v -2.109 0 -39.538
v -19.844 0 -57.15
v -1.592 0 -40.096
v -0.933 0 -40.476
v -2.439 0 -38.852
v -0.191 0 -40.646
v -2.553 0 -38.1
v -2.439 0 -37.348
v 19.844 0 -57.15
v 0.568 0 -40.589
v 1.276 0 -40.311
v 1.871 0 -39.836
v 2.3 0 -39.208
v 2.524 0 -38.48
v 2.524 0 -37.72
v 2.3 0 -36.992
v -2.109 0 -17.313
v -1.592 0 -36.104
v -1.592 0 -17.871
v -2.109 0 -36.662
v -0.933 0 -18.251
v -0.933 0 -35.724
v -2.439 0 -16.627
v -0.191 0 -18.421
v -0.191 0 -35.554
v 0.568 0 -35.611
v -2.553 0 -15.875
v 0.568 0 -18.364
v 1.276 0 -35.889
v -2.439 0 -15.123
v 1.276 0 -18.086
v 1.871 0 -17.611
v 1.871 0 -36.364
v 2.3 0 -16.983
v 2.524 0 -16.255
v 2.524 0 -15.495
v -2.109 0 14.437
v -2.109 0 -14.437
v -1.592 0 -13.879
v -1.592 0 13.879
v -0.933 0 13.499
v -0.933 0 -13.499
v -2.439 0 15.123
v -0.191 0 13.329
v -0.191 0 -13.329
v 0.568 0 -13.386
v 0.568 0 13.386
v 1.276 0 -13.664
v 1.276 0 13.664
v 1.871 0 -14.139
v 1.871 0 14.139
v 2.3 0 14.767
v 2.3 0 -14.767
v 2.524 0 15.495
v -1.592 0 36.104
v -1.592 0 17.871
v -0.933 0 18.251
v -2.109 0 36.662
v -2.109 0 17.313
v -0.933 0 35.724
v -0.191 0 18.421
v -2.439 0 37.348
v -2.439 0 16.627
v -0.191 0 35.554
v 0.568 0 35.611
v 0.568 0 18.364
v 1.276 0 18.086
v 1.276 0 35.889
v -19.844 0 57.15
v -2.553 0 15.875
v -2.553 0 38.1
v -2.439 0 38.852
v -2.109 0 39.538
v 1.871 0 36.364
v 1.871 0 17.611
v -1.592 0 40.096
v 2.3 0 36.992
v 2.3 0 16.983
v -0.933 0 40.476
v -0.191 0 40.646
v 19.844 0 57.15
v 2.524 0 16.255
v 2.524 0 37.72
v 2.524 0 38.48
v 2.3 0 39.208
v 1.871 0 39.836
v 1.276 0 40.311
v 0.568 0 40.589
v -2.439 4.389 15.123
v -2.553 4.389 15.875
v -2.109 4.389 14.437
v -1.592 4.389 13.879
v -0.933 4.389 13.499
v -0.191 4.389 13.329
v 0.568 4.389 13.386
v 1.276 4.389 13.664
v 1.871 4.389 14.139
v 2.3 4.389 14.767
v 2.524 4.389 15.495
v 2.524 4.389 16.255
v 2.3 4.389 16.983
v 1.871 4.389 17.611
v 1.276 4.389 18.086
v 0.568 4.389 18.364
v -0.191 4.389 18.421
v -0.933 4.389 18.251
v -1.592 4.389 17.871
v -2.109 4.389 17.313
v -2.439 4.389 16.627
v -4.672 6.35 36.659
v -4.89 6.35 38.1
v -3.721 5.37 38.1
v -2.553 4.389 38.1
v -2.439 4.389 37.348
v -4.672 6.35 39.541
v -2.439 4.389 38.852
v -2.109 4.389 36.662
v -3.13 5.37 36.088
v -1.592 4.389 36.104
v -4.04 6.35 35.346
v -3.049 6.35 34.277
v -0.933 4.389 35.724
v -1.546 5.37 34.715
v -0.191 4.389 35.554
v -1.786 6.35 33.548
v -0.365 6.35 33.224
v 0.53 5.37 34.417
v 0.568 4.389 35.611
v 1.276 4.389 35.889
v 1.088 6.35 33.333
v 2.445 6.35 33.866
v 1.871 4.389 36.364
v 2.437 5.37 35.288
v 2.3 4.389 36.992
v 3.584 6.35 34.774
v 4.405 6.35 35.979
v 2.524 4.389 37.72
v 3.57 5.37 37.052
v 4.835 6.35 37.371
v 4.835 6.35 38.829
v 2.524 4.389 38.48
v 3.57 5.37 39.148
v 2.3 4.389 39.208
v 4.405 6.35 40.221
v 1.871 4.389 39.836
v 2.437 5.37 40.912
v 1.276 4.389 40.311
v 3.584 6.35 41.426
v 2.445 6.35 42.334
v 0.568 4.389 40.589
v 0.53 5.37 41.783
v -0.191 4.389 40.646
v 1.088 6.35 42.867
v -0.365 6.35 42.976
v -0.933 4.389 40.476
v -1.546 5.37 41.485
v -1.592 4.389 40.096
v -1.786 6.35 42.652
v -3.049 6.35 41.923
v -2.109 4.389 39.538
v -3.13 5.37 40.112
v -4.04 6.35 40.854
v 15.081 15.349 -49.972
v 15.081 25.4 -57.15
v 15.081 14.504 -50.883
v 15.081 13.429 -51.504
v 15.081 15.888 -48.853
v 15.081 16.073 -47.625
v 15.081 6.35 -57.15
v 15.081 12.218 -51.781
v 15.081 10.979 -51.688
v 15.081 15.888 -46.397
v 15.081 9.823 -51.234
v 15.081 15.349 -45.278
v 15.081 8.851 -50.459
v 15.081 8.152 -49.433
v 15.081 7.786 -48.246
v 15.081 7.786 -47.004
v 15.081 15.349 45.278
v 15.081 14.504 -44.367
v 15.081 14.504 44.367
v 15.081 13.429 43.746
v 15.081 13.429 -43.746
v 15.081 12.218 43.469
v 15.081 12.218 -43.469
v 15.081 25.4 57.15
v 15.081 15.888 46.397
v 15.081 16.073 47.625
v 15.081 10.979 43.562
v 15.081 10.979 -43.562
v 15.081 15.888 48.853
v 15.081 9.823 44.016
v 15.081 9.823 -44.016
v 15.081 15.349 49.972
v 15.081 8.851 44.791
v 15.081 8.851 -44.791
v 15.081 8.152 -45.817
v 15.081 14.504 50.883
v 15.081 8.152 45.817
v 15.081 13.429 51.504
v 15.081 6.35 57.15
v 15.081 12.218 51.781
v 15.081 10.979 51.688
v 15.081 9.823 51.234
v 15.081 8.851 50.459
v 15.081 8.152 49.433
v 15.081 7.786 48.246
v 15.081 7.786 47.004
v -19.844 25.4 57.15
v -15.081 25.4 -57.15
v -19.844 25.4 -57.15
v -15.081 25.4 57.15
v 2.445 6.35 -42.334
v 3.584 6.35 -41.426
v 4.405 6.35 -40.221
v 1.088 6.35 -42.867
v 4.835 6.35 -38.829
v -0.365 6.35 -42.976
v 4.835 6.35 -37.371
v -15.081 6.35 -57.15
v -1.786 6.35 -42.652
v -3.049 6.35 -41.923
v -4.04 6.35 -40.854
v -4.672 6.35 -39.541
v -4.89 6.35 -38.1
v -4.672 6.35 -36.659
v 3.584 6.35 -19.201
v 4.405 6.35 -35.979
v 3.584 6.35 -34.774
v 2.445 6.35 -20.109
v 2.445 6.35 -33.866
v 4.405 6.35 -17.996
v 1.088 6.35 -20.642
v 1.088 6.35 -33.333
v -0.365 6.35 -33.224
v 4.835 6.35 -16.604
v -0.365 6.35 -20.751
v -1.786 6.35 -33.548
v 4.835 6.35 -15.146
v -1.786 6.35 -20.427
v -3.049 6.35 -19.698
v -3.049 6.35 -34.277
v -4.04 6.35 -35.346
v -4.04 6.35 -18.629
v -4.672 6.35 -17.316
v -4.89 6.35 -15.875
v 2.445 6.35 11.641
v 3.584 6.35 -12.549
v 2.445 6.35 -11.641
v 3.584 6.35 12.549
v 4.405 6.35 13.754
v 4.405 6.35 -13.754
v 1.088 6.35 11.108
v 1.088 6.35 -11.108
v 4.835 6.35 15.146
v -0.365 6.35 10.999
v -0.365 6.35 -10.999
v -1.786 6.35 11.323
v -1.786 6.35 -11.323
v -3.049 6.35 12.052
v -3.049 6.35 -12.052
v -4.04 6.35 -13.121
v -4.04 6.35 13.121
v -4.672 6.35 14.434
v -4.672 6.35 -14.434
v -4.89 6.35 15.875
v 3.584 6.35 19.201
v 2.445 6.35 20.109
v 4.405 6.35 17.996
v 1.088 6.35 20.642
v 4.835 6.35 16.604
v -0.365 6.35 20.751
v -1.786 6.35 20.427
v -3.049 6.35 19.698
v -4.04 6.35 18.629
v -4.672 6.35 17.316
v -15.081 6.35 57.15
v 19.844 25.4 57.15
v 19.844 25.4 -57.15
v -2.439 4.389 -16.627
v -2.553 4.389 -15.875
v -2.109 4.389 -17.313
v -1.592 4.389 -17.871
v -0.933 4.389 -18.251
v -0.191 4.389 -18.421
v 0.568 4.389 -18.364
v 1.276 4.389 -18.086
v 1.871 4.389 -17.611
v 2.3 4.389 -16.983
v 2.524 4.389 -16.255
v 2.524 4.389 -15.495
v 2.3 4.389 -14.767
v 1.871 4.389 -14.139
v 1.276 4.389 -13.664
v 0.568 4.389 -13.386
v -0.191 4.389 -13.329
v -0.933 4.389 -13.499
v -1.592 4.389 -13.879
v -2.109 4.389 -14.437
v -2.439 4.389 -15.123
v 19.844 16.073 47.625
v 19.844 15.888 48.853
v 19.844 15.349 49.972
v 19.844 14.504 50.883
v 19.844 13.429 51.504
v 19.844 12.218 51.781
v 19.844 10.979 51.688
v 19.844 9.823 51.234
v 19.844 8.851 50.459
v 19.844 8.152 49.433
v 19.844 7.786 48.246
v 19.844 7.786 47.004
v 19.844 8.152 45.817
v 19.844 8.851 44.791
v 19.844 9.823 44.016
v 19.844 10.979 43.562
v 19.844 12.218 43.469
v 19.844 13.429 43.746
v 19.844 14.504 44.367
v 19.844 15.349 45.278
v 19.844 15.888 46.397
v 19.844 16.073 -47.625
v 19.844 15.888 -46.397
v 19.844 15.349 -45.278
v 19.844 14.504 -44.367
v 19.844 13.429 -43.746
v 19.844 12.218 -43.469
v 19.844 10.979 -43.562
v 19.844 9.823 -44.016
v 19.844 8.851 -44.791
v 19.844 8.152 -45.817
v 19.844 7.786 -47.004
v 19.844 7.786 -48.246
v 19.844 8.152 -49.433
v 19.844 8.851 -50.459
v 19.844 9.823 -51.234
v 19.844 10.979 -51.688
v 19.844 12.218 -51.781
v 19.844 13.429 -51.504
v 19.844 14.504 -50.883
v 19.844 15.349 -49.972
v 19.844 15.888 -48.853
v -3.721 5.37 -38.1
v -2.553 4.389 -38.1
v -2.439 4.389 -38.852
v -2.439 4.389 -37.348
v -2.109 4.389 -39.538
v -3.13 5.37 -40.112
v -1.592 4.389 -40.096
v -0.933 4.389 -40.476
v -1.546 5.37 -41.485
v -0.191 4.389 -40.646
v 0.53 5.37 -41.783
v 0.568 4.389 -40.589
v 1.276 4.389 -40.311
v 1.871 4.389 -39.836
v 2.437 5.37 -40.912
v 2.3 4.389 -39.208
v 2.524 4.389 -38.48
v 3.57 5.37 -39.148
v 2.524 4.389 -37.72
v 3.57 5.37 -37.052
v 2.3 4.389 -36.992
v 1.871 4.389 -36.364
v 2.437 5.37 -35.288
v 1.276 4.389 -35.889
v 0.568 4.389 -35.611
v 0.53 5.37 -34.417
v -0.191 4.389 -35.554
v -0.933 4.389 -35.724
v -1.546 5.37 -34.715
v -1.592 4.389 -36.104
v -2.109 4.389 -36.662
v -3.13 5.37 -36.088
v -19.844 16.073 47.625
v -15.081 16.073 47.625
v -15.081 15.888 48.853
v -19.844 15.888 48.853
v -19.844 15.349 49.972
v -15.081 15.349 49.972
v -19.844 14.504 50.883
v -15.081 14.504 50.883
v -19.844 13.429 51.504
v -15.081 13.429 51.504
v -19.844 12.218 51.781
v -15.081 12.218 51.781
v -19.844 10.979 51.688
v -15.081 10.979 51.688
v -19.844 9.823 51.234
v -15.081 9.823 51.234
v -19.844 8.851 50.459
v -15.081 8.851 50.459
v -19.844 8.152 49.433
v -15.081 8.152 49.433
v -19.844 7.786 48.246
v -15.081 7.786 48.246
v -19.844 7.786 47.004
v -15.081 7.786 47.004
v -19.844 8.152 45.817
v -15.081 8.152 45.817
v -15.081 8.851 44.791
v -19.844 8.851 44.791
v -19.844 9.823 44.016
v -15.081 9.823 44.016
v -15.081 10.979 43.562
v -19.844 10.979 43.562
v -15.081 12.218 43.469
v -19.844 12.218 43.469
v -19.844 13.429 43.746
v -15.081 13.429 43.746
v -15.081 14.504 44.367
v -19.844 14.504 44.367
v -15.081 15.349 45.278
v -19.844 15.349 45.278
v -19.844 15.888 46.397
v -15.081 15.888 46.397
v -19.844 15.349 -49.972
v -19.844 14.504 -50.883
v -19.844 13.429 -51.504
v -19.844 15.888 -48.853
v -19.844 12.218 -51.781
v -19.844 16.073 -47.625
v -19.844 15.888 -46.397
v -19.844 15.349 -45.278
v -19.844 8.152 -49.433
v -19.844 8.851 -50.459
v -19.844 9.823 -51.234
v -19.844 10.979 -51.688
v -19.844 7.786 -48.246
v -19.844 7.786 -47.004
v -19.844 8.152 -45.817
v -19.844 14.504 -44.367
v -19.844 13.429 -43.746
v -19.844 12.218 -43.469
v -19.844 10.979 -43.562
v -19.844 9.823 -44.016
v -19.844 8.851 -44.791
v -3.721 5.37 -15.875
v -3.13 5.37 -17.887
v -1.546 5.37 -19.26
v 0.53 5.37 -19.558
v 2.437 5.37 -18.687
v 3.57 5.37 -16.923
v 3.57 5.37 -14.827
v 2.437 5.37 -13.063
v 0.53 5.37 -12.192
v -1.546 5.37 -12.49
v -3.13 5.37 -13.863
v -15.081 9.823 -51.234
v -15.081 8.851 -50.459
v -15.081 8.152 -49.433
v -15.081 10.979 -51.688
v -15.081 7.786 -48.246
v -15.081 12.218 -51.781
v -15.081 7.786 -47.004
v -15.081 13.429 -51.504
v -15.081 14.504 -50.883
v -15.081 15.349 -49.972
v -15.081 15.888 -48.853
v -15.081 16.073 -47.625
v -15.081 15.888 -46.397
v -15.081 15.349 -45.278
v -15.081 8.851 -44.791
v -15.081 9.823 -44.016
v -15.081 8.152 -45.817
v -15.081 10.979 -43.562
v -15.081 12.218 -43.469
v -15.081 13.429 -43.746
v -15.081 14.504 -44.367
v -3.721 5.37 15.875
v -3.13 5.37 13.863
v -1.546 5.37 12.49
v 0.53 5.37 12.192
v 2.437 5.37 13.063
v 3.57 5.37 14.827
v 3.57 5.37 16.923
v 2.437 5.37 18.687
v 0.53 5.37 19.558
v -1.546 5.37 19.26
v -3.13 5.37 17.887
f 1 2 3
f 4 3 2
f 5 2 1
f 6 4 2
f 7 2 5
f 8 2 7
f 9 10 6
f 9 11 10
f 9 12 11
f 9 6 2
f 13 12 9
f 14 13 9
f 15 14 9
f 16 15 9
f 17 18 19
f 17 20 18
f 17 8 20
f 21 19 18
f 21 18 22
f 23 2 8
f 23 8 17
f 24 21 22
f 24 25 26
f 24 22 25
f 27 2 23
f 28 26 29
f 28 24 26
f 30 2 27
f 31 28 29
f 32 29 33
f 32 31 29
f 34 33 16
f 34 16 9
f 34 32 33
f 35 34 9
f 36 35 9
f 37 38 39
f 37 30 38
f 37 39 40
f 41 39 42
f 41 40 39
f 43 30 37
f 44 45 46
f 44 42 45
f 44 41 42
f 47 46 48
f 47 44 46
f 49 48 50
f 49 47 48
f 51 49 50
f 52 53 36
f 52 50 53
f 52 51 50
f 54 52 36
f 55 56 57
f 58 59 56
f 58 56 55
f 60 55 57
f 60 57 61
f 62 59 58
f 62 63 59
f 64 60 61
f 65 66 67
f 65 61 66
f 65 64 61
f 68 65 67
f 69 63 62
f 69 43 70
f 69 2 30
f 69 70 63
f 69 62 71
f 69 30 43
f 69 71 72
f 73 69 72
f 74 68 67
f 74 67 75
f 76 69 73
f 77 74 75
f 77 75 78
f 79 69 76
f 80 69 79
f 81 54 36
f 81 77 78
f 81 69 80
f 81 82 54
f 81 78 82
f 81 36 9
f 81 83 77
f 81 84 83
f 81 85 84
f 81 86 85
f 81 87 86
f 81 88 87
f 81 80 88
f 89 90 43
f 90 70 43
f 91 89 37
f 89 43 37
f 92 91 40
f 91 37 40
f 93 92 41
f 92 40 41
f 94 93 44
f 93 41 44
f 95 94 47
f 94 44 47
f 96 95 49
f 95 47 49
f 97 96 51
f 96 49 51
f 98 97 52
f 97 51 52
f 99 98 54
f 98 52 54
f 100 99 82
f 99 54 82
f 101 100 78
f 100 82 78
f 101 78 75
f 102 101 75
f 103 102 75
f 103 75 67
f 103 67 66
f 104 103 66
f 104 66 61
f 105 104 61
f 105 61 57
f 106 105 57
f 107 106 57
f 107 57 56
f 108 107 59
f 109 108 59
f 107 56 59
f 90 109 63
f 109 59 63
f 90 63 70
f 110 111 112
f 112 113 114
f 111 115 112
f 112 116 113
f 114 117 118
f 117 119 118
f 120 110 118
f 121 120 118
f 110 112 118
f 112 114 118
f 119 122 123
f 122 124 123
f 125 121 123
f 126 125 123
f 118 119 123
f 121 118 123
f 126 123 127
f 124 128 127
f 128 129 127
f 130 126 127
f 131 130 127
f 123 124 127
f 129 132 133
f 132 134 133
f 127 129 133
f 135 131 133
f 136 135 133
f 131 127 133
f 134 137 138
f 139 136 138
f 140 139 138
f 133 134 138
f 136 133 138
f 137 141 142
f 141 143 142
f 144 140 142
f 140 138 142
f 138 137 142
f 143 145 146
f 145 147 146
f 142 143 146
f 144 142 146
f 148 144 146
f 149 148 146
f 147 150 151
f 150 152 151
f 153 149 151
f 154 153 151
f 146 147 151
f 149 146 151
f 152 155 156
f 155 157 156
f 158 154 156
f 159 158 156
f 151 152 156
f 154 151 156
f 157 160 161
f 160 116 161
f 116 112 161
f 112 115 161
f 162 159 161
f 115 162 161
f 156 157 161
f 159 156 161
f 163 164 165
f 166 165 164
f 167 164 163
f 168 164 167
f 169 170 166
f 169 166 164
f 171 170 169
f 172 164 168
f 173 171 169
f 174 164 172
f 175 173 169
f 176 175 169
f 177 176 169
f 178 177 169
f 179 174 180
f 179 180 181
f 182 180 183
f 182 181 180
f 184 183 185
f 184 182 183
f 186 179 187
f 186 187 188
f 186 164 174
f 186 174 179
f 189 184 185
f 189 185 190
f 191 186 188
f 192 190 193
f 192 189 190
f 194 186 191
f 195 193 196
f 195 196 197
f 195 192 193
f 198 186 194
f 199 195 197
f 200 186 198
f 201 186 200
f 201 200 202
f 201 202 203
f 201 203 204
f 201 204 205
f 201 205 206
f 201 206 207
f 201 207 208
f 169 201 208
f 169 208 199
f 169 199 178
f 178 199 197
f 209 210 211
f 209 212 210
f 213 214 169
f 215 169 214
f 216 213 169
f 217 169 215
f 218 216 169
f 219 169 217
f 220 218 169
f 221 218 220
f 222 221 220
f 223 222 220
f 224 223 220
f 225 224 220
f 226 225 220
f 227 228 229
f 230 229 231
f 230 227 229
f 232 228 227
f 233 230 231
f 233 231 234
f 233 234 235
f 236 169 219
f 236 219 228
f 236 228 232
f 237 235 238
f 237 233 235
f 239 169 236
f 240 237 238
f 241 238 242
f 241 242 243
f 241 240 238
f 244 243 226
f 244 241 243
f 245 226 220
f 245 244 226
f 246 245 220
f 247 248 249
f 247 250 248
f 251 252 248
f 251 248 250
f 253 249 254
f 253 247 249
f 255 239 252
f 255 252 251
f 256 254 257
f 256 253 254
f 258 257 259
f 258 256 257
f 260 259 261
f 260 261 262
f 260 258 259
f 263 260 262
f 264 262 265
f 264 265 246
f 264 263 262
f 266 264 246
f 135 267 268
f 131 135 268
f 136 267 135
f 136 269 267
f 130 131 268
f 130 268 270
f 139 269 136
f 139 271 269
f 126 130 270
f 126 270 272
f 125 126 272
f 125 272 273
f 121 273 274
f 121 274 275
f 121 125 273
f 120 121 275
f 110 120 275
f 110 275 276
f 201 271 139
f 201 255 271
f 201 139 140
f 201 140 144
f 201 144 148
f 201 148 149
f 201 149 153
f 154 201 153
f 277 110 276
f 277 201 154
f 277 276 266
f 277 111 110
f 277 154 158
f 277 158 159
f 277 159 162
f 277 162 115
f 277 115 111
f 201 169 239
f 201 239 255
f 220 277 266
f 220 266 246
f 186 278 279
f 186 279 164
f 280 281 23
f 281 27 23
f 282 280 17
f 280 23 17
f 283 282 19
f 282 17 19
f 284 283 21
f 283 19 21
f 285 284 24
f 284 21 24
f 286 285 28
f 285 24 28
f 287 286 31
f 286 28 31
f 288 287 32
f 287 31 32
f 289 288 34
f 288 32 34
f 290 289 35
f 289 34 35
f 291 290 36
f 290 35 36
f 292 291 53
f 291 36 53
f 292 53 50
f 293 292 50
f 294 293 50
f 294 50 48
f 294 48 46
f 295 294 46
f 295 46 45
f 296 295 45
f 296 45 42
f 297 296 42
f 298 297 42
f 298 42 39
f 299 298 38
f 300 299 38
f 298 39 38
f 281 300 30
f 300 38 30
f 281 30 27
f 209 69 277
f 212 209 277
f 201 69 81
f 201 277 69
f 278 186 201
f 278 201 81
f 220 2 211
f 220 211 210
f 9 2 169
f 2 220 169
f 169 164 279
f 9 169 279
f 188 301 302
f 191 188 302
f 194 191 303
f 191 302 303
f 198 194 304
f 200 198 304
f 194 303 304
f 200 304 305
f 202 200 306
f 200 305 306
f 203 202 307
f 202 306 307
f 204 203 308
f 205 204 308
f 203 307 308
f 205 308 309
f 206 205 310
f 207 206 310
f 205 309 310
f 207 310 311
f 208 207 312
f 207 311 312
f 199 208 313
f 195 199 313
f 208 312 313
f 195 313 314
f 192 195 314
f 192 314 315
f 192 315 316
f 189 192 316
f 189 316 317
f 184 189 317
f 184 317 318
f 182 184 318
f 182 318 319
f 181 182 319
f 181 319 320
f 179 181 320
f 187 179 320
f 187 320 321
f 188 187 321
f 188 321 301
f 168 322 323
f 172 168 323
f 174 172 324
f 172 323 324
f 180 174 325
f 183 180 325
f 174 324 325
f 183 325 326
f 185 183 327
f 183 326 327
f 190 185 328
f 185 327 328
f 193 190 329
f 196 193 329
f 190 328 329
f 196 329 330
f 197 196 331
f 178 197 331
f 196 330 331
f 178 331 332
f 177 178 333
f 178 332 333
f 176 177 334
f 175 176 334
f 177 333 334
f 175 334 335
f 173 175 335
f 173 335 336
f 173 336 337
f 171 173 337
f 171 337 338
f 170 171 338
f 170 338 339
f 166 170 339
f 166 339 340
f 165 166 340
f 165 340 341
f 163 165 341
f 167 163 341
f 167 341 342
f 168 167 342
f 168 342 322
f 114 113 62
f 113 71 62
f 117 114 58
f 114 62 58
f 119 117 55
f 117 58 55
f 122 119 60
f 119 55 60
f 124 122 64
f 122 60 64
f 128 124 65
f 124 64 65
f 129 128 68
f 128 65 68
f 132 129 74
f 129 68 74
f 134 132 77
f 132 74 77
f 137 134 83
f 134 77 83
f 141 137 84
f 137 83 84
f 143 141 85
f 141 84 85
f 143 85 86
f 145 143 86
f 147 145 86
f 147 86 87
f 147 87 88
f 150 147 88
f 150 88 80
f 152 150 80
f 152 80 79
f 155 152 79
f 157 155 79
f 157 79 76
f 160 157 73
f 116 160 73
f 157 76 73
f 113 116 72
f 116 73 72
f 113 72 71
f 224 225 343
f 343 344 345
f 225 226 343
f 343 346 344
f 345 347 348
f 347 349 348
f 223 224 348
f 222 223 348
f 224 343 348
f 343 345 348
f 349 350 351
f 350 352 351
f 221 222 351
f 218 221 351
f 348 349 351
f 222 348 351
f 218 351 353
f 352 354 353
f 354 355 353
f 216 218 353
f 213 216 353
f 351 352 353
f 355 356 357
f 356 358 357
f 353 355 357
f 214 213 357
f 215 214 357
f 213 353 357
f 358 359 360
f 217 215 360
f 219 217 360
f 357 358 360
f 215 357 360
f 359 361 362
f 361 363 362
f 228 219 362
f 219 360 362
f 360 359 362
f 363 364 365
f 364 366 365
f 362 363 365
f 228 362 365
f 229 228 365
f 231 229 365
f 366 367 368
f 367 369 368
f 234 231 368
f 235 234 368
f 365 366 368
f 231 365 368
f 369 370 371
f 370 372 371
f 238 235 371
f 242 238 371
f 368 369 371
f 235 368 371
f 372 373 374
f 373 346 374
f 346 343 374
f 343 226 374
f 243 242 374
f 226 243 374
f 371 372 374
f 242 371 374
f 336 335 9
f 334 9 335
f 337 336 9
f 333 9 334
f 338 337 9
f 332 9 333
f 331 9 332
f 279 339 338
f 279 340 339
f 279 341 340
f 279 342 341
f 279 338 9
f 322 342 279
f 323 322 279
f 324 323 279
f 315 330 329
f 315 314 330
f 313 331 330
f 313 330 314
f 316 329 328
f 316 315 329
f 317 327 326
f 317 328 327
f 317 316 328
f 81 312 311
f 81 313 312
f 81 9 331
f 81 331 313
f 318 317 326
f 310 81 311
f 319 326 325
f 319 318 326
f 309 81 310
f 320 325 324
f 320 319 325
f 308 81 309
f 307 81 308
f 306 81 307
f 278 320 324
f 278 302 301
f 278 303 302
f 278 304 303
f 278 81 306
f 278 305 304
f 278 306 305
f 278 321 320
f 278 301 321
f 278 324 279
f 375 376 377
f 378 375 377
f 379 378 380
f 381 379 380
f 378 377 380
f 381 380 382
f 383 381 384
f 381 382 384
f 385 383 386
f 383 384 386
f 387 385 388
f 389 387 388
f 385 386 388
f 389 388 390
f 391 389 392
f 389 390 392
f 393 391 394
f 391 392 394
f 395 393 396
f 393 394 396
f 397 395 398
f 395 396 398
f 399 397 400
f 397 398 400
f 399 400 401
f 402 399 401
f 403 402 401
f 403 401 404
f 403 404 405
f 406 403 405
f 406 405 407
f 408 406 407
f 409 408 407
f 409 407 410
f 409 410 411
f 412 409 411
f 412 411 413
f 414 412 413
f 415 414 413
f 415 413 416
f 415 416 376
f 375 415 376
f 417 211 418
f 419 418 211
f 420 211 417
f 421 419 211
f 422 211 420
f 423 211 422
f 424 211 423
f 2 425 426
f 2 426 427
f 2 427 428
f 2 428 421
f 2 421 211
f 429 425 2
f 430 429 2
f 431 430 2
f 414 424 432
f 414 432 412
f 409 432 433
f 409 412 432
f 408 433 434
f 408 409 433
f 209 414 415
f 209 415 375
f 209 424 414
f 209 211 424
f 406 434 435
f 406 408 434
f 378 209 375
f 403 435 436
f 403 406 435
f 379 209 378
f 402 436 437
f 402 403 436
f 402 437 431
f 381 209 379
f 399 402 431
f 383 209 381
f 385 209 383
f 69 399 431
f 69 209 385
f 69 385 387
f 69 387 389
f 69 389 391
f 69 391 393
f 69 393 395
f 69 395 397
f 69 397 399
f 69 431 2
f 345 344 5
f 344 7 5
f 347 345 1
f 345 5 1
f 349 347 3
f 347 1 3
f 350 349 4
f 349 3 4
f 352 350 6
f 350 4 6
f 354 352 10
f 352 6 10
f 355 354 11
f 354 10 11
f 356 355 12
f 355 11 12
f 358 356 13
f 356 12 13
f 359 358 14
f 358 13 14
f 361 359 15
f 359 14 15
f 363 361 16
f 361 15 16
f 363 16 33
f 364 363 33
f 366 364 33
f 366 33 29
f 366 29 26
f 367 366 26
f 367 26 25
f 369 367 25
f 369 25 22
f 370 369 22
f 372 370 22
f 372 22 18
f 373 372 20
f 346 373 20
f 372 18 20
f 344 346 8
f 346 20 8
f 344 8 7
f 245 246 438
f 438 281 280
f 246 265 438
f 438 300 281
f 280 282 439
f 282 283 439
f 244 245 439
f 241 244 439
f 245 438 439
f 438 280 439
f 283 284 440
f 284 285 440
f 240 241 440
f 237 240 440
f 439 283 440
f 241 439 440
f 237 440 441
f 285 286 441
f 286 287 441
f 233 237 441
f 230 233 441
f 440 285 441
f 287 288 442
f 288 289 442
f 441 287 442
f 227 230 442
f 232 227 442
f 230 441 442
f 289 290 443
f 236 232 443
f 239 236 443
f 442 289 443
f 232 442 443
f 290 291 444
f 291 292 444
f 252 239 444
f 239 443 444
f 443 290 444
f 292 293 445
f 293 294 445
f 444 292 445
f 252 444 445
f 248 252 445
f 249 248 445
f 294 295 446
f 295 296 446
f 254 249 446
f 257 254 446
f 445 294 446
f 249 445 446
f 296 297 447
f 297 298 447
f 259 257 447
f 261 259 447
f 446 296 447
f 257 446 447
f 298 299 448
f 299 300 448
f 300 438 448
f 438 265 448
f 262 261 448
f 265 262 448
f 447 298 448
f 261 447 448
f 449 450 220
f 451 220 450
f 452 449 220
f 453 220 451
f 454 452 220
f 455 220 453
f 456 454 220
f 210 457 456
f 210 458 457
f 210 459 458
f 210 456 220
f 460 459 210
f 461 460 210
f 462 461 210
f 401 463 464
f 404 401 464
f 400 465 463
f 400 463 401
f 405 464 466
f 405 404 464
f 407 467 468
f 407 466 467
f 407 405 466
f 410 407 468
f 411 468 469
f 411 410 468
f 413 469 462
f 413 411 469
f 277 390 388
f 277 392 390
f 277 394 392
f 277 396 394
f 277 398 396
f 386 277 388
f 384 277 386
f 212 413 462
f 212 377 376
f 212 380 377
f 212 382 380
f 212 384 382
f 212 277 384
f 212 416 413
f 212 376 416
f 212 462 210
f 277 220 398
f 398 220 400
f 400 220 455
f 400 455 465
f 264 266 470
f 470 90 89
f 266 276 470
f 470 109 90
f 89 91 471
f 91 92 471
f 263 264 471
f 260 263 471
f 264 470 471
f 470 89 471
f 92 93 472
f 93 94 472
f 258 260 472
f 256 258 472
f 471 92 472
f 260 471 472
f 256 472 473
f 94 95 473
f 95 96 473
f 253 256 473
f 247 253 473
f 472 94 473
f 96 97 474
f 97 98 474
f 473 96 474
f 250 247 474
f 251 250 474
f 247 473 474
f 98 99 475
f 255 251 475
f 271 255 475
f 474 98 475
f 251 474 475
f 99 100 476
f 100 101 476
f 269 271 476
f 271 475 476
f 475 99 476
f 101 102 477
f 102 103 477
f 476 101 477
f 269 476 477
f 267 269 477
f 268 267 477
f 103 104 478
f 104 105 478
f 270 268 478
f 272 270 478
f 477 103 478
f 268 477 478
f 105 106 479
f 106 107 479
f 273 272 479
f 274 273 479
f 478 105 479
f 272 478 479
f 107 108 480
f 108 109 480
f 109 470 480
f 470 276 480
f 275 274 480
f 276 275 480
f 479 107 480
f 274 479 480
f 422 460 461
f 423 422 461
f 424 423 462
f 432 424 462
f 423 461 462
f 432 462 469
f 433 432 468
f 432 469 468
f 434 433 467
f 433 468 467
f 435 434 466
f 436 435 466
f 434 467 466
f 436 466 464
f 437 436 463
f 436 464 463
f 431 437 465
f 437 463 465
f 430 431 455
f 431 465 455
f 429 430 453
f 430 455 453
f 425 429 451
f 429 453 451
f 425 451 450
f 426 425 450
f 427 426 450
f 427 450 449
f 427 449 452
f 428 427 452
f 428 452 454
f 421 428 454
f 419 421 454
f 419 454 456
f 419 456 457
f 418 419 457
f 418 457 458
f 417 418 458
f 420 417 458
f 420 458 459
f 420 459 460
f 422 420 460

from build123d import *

# Parameters (mm, degrees)
BOSS_EXTRUDE1_DEPTH                                = 57.15
CSK_FOR_10_FLAT_HEAD_MACHINE_SCREW_100_D           = 5.1054
CSK_FOR_10_FLAT_HEAD_MACHINE_SCREW_100_CSINK_D     = 9.779
CSK_FOR_10_FLAT_HEAD_MACHINE_SCREW_100_CSINK_ANGLE = 100
SKETCH6_OUTSIDE_W                                  = 141.026
SKETCH6_OUTSIDE_H                                  = 52.126
SKETCH6_OUTSIDE_W_2                                = 114.3
SKETCH6_OUTSIDE_H_2                                = 25.4
SKETCH6_OUTSIDE_R                                  = 4.1671875
CUT_EXTRUDE2_DEPTH                                 = 75.070102985


with BuildPart() as part:
    # Sketch1 → Boss-Extrude1 (new, symmetric)
    with BuildSketch(Plane.XY):
        Polygon((-19.84375, 25.4), (-19.84375, 0), (19.84375, 0), (19.84375, 25.4), (15.08125, 25.4), (15.08125, 6.35), (-15.08125, 6.35), (-15.08125, 25.4), align=None)
    extrude(amount=BOSS_EXTRUDE1_DEPTH, both=True)

    # CSK for #10 Flat Head Machine Screw (100)1 (through all)
    with Locations(Plane(origin=(0, 6.35, 0), x_dir=(1, 0, 0), z_dir=(0, 1, 0))):
        with Locations((0, 15.875), (0, 38.1), (0, -15.875), (0, -38.1)):
            CounterSinkHole(CSK_FOR_10_FLAT_HEAD_MACHINE_SCREW_100_D / 2, CSK_FOR_10_FLAT_HEAD_MACHINE_SCREW_100_CSINK_D / 2, counter_sink_angle=CSK_FOR_10_FLAT_HEAD_MACHINE_SCREW_100_CSINK_ANGLE)

    # Sketch6 outside → Cut-Extrude2 (cut, through all)
    # profile 1 of 3: a face of its own
    with BuildSketch(Plane(origin=(19.84375, 0, 0), x_dir=(0, 0, -1), z_dir=(1, 0, 0))):
        with Locations((0, 12.7)):
            Rectangle(SKETCH6_OUTSIDE_W, SKETCH6_OUTSIDE_H)
        with Locations((0, 12.7)):
            Rectangle(SKETCH6_OUTSIDE_W_2, SKETCH6_OUTSIDE_H_2, mode=Mode.SUBTRACT)
    # profile 2 of 3: a face of its own
    with BuildSketch(Plane(origin=(19.84375, 0, 0), x_dir=(0, 0, -1), z_dir=(1, 0, 0))):
        with Locations(Location((-47.625, 11.90625, 0), (0, 0, 90))):
            Circle(SKETCH6_OUTSIDE_R)
    # profile 3 of 3: a face of its own
    with BuildSketch(Plane(origin=(19.84375, 0, 0), x_dir=(0, 0, -1), z_dir=(1, 0, 0))):
        with Locations(Location((47.625, 11.90625, 0), (0, 0, 90))):
            Circle(SKETCH6_OUTSIDE_R)
    extrude(amount=-CUT_EXTRUDE2_DEPTH, mode=Mode.SUBTRACT)


solid = part.part
